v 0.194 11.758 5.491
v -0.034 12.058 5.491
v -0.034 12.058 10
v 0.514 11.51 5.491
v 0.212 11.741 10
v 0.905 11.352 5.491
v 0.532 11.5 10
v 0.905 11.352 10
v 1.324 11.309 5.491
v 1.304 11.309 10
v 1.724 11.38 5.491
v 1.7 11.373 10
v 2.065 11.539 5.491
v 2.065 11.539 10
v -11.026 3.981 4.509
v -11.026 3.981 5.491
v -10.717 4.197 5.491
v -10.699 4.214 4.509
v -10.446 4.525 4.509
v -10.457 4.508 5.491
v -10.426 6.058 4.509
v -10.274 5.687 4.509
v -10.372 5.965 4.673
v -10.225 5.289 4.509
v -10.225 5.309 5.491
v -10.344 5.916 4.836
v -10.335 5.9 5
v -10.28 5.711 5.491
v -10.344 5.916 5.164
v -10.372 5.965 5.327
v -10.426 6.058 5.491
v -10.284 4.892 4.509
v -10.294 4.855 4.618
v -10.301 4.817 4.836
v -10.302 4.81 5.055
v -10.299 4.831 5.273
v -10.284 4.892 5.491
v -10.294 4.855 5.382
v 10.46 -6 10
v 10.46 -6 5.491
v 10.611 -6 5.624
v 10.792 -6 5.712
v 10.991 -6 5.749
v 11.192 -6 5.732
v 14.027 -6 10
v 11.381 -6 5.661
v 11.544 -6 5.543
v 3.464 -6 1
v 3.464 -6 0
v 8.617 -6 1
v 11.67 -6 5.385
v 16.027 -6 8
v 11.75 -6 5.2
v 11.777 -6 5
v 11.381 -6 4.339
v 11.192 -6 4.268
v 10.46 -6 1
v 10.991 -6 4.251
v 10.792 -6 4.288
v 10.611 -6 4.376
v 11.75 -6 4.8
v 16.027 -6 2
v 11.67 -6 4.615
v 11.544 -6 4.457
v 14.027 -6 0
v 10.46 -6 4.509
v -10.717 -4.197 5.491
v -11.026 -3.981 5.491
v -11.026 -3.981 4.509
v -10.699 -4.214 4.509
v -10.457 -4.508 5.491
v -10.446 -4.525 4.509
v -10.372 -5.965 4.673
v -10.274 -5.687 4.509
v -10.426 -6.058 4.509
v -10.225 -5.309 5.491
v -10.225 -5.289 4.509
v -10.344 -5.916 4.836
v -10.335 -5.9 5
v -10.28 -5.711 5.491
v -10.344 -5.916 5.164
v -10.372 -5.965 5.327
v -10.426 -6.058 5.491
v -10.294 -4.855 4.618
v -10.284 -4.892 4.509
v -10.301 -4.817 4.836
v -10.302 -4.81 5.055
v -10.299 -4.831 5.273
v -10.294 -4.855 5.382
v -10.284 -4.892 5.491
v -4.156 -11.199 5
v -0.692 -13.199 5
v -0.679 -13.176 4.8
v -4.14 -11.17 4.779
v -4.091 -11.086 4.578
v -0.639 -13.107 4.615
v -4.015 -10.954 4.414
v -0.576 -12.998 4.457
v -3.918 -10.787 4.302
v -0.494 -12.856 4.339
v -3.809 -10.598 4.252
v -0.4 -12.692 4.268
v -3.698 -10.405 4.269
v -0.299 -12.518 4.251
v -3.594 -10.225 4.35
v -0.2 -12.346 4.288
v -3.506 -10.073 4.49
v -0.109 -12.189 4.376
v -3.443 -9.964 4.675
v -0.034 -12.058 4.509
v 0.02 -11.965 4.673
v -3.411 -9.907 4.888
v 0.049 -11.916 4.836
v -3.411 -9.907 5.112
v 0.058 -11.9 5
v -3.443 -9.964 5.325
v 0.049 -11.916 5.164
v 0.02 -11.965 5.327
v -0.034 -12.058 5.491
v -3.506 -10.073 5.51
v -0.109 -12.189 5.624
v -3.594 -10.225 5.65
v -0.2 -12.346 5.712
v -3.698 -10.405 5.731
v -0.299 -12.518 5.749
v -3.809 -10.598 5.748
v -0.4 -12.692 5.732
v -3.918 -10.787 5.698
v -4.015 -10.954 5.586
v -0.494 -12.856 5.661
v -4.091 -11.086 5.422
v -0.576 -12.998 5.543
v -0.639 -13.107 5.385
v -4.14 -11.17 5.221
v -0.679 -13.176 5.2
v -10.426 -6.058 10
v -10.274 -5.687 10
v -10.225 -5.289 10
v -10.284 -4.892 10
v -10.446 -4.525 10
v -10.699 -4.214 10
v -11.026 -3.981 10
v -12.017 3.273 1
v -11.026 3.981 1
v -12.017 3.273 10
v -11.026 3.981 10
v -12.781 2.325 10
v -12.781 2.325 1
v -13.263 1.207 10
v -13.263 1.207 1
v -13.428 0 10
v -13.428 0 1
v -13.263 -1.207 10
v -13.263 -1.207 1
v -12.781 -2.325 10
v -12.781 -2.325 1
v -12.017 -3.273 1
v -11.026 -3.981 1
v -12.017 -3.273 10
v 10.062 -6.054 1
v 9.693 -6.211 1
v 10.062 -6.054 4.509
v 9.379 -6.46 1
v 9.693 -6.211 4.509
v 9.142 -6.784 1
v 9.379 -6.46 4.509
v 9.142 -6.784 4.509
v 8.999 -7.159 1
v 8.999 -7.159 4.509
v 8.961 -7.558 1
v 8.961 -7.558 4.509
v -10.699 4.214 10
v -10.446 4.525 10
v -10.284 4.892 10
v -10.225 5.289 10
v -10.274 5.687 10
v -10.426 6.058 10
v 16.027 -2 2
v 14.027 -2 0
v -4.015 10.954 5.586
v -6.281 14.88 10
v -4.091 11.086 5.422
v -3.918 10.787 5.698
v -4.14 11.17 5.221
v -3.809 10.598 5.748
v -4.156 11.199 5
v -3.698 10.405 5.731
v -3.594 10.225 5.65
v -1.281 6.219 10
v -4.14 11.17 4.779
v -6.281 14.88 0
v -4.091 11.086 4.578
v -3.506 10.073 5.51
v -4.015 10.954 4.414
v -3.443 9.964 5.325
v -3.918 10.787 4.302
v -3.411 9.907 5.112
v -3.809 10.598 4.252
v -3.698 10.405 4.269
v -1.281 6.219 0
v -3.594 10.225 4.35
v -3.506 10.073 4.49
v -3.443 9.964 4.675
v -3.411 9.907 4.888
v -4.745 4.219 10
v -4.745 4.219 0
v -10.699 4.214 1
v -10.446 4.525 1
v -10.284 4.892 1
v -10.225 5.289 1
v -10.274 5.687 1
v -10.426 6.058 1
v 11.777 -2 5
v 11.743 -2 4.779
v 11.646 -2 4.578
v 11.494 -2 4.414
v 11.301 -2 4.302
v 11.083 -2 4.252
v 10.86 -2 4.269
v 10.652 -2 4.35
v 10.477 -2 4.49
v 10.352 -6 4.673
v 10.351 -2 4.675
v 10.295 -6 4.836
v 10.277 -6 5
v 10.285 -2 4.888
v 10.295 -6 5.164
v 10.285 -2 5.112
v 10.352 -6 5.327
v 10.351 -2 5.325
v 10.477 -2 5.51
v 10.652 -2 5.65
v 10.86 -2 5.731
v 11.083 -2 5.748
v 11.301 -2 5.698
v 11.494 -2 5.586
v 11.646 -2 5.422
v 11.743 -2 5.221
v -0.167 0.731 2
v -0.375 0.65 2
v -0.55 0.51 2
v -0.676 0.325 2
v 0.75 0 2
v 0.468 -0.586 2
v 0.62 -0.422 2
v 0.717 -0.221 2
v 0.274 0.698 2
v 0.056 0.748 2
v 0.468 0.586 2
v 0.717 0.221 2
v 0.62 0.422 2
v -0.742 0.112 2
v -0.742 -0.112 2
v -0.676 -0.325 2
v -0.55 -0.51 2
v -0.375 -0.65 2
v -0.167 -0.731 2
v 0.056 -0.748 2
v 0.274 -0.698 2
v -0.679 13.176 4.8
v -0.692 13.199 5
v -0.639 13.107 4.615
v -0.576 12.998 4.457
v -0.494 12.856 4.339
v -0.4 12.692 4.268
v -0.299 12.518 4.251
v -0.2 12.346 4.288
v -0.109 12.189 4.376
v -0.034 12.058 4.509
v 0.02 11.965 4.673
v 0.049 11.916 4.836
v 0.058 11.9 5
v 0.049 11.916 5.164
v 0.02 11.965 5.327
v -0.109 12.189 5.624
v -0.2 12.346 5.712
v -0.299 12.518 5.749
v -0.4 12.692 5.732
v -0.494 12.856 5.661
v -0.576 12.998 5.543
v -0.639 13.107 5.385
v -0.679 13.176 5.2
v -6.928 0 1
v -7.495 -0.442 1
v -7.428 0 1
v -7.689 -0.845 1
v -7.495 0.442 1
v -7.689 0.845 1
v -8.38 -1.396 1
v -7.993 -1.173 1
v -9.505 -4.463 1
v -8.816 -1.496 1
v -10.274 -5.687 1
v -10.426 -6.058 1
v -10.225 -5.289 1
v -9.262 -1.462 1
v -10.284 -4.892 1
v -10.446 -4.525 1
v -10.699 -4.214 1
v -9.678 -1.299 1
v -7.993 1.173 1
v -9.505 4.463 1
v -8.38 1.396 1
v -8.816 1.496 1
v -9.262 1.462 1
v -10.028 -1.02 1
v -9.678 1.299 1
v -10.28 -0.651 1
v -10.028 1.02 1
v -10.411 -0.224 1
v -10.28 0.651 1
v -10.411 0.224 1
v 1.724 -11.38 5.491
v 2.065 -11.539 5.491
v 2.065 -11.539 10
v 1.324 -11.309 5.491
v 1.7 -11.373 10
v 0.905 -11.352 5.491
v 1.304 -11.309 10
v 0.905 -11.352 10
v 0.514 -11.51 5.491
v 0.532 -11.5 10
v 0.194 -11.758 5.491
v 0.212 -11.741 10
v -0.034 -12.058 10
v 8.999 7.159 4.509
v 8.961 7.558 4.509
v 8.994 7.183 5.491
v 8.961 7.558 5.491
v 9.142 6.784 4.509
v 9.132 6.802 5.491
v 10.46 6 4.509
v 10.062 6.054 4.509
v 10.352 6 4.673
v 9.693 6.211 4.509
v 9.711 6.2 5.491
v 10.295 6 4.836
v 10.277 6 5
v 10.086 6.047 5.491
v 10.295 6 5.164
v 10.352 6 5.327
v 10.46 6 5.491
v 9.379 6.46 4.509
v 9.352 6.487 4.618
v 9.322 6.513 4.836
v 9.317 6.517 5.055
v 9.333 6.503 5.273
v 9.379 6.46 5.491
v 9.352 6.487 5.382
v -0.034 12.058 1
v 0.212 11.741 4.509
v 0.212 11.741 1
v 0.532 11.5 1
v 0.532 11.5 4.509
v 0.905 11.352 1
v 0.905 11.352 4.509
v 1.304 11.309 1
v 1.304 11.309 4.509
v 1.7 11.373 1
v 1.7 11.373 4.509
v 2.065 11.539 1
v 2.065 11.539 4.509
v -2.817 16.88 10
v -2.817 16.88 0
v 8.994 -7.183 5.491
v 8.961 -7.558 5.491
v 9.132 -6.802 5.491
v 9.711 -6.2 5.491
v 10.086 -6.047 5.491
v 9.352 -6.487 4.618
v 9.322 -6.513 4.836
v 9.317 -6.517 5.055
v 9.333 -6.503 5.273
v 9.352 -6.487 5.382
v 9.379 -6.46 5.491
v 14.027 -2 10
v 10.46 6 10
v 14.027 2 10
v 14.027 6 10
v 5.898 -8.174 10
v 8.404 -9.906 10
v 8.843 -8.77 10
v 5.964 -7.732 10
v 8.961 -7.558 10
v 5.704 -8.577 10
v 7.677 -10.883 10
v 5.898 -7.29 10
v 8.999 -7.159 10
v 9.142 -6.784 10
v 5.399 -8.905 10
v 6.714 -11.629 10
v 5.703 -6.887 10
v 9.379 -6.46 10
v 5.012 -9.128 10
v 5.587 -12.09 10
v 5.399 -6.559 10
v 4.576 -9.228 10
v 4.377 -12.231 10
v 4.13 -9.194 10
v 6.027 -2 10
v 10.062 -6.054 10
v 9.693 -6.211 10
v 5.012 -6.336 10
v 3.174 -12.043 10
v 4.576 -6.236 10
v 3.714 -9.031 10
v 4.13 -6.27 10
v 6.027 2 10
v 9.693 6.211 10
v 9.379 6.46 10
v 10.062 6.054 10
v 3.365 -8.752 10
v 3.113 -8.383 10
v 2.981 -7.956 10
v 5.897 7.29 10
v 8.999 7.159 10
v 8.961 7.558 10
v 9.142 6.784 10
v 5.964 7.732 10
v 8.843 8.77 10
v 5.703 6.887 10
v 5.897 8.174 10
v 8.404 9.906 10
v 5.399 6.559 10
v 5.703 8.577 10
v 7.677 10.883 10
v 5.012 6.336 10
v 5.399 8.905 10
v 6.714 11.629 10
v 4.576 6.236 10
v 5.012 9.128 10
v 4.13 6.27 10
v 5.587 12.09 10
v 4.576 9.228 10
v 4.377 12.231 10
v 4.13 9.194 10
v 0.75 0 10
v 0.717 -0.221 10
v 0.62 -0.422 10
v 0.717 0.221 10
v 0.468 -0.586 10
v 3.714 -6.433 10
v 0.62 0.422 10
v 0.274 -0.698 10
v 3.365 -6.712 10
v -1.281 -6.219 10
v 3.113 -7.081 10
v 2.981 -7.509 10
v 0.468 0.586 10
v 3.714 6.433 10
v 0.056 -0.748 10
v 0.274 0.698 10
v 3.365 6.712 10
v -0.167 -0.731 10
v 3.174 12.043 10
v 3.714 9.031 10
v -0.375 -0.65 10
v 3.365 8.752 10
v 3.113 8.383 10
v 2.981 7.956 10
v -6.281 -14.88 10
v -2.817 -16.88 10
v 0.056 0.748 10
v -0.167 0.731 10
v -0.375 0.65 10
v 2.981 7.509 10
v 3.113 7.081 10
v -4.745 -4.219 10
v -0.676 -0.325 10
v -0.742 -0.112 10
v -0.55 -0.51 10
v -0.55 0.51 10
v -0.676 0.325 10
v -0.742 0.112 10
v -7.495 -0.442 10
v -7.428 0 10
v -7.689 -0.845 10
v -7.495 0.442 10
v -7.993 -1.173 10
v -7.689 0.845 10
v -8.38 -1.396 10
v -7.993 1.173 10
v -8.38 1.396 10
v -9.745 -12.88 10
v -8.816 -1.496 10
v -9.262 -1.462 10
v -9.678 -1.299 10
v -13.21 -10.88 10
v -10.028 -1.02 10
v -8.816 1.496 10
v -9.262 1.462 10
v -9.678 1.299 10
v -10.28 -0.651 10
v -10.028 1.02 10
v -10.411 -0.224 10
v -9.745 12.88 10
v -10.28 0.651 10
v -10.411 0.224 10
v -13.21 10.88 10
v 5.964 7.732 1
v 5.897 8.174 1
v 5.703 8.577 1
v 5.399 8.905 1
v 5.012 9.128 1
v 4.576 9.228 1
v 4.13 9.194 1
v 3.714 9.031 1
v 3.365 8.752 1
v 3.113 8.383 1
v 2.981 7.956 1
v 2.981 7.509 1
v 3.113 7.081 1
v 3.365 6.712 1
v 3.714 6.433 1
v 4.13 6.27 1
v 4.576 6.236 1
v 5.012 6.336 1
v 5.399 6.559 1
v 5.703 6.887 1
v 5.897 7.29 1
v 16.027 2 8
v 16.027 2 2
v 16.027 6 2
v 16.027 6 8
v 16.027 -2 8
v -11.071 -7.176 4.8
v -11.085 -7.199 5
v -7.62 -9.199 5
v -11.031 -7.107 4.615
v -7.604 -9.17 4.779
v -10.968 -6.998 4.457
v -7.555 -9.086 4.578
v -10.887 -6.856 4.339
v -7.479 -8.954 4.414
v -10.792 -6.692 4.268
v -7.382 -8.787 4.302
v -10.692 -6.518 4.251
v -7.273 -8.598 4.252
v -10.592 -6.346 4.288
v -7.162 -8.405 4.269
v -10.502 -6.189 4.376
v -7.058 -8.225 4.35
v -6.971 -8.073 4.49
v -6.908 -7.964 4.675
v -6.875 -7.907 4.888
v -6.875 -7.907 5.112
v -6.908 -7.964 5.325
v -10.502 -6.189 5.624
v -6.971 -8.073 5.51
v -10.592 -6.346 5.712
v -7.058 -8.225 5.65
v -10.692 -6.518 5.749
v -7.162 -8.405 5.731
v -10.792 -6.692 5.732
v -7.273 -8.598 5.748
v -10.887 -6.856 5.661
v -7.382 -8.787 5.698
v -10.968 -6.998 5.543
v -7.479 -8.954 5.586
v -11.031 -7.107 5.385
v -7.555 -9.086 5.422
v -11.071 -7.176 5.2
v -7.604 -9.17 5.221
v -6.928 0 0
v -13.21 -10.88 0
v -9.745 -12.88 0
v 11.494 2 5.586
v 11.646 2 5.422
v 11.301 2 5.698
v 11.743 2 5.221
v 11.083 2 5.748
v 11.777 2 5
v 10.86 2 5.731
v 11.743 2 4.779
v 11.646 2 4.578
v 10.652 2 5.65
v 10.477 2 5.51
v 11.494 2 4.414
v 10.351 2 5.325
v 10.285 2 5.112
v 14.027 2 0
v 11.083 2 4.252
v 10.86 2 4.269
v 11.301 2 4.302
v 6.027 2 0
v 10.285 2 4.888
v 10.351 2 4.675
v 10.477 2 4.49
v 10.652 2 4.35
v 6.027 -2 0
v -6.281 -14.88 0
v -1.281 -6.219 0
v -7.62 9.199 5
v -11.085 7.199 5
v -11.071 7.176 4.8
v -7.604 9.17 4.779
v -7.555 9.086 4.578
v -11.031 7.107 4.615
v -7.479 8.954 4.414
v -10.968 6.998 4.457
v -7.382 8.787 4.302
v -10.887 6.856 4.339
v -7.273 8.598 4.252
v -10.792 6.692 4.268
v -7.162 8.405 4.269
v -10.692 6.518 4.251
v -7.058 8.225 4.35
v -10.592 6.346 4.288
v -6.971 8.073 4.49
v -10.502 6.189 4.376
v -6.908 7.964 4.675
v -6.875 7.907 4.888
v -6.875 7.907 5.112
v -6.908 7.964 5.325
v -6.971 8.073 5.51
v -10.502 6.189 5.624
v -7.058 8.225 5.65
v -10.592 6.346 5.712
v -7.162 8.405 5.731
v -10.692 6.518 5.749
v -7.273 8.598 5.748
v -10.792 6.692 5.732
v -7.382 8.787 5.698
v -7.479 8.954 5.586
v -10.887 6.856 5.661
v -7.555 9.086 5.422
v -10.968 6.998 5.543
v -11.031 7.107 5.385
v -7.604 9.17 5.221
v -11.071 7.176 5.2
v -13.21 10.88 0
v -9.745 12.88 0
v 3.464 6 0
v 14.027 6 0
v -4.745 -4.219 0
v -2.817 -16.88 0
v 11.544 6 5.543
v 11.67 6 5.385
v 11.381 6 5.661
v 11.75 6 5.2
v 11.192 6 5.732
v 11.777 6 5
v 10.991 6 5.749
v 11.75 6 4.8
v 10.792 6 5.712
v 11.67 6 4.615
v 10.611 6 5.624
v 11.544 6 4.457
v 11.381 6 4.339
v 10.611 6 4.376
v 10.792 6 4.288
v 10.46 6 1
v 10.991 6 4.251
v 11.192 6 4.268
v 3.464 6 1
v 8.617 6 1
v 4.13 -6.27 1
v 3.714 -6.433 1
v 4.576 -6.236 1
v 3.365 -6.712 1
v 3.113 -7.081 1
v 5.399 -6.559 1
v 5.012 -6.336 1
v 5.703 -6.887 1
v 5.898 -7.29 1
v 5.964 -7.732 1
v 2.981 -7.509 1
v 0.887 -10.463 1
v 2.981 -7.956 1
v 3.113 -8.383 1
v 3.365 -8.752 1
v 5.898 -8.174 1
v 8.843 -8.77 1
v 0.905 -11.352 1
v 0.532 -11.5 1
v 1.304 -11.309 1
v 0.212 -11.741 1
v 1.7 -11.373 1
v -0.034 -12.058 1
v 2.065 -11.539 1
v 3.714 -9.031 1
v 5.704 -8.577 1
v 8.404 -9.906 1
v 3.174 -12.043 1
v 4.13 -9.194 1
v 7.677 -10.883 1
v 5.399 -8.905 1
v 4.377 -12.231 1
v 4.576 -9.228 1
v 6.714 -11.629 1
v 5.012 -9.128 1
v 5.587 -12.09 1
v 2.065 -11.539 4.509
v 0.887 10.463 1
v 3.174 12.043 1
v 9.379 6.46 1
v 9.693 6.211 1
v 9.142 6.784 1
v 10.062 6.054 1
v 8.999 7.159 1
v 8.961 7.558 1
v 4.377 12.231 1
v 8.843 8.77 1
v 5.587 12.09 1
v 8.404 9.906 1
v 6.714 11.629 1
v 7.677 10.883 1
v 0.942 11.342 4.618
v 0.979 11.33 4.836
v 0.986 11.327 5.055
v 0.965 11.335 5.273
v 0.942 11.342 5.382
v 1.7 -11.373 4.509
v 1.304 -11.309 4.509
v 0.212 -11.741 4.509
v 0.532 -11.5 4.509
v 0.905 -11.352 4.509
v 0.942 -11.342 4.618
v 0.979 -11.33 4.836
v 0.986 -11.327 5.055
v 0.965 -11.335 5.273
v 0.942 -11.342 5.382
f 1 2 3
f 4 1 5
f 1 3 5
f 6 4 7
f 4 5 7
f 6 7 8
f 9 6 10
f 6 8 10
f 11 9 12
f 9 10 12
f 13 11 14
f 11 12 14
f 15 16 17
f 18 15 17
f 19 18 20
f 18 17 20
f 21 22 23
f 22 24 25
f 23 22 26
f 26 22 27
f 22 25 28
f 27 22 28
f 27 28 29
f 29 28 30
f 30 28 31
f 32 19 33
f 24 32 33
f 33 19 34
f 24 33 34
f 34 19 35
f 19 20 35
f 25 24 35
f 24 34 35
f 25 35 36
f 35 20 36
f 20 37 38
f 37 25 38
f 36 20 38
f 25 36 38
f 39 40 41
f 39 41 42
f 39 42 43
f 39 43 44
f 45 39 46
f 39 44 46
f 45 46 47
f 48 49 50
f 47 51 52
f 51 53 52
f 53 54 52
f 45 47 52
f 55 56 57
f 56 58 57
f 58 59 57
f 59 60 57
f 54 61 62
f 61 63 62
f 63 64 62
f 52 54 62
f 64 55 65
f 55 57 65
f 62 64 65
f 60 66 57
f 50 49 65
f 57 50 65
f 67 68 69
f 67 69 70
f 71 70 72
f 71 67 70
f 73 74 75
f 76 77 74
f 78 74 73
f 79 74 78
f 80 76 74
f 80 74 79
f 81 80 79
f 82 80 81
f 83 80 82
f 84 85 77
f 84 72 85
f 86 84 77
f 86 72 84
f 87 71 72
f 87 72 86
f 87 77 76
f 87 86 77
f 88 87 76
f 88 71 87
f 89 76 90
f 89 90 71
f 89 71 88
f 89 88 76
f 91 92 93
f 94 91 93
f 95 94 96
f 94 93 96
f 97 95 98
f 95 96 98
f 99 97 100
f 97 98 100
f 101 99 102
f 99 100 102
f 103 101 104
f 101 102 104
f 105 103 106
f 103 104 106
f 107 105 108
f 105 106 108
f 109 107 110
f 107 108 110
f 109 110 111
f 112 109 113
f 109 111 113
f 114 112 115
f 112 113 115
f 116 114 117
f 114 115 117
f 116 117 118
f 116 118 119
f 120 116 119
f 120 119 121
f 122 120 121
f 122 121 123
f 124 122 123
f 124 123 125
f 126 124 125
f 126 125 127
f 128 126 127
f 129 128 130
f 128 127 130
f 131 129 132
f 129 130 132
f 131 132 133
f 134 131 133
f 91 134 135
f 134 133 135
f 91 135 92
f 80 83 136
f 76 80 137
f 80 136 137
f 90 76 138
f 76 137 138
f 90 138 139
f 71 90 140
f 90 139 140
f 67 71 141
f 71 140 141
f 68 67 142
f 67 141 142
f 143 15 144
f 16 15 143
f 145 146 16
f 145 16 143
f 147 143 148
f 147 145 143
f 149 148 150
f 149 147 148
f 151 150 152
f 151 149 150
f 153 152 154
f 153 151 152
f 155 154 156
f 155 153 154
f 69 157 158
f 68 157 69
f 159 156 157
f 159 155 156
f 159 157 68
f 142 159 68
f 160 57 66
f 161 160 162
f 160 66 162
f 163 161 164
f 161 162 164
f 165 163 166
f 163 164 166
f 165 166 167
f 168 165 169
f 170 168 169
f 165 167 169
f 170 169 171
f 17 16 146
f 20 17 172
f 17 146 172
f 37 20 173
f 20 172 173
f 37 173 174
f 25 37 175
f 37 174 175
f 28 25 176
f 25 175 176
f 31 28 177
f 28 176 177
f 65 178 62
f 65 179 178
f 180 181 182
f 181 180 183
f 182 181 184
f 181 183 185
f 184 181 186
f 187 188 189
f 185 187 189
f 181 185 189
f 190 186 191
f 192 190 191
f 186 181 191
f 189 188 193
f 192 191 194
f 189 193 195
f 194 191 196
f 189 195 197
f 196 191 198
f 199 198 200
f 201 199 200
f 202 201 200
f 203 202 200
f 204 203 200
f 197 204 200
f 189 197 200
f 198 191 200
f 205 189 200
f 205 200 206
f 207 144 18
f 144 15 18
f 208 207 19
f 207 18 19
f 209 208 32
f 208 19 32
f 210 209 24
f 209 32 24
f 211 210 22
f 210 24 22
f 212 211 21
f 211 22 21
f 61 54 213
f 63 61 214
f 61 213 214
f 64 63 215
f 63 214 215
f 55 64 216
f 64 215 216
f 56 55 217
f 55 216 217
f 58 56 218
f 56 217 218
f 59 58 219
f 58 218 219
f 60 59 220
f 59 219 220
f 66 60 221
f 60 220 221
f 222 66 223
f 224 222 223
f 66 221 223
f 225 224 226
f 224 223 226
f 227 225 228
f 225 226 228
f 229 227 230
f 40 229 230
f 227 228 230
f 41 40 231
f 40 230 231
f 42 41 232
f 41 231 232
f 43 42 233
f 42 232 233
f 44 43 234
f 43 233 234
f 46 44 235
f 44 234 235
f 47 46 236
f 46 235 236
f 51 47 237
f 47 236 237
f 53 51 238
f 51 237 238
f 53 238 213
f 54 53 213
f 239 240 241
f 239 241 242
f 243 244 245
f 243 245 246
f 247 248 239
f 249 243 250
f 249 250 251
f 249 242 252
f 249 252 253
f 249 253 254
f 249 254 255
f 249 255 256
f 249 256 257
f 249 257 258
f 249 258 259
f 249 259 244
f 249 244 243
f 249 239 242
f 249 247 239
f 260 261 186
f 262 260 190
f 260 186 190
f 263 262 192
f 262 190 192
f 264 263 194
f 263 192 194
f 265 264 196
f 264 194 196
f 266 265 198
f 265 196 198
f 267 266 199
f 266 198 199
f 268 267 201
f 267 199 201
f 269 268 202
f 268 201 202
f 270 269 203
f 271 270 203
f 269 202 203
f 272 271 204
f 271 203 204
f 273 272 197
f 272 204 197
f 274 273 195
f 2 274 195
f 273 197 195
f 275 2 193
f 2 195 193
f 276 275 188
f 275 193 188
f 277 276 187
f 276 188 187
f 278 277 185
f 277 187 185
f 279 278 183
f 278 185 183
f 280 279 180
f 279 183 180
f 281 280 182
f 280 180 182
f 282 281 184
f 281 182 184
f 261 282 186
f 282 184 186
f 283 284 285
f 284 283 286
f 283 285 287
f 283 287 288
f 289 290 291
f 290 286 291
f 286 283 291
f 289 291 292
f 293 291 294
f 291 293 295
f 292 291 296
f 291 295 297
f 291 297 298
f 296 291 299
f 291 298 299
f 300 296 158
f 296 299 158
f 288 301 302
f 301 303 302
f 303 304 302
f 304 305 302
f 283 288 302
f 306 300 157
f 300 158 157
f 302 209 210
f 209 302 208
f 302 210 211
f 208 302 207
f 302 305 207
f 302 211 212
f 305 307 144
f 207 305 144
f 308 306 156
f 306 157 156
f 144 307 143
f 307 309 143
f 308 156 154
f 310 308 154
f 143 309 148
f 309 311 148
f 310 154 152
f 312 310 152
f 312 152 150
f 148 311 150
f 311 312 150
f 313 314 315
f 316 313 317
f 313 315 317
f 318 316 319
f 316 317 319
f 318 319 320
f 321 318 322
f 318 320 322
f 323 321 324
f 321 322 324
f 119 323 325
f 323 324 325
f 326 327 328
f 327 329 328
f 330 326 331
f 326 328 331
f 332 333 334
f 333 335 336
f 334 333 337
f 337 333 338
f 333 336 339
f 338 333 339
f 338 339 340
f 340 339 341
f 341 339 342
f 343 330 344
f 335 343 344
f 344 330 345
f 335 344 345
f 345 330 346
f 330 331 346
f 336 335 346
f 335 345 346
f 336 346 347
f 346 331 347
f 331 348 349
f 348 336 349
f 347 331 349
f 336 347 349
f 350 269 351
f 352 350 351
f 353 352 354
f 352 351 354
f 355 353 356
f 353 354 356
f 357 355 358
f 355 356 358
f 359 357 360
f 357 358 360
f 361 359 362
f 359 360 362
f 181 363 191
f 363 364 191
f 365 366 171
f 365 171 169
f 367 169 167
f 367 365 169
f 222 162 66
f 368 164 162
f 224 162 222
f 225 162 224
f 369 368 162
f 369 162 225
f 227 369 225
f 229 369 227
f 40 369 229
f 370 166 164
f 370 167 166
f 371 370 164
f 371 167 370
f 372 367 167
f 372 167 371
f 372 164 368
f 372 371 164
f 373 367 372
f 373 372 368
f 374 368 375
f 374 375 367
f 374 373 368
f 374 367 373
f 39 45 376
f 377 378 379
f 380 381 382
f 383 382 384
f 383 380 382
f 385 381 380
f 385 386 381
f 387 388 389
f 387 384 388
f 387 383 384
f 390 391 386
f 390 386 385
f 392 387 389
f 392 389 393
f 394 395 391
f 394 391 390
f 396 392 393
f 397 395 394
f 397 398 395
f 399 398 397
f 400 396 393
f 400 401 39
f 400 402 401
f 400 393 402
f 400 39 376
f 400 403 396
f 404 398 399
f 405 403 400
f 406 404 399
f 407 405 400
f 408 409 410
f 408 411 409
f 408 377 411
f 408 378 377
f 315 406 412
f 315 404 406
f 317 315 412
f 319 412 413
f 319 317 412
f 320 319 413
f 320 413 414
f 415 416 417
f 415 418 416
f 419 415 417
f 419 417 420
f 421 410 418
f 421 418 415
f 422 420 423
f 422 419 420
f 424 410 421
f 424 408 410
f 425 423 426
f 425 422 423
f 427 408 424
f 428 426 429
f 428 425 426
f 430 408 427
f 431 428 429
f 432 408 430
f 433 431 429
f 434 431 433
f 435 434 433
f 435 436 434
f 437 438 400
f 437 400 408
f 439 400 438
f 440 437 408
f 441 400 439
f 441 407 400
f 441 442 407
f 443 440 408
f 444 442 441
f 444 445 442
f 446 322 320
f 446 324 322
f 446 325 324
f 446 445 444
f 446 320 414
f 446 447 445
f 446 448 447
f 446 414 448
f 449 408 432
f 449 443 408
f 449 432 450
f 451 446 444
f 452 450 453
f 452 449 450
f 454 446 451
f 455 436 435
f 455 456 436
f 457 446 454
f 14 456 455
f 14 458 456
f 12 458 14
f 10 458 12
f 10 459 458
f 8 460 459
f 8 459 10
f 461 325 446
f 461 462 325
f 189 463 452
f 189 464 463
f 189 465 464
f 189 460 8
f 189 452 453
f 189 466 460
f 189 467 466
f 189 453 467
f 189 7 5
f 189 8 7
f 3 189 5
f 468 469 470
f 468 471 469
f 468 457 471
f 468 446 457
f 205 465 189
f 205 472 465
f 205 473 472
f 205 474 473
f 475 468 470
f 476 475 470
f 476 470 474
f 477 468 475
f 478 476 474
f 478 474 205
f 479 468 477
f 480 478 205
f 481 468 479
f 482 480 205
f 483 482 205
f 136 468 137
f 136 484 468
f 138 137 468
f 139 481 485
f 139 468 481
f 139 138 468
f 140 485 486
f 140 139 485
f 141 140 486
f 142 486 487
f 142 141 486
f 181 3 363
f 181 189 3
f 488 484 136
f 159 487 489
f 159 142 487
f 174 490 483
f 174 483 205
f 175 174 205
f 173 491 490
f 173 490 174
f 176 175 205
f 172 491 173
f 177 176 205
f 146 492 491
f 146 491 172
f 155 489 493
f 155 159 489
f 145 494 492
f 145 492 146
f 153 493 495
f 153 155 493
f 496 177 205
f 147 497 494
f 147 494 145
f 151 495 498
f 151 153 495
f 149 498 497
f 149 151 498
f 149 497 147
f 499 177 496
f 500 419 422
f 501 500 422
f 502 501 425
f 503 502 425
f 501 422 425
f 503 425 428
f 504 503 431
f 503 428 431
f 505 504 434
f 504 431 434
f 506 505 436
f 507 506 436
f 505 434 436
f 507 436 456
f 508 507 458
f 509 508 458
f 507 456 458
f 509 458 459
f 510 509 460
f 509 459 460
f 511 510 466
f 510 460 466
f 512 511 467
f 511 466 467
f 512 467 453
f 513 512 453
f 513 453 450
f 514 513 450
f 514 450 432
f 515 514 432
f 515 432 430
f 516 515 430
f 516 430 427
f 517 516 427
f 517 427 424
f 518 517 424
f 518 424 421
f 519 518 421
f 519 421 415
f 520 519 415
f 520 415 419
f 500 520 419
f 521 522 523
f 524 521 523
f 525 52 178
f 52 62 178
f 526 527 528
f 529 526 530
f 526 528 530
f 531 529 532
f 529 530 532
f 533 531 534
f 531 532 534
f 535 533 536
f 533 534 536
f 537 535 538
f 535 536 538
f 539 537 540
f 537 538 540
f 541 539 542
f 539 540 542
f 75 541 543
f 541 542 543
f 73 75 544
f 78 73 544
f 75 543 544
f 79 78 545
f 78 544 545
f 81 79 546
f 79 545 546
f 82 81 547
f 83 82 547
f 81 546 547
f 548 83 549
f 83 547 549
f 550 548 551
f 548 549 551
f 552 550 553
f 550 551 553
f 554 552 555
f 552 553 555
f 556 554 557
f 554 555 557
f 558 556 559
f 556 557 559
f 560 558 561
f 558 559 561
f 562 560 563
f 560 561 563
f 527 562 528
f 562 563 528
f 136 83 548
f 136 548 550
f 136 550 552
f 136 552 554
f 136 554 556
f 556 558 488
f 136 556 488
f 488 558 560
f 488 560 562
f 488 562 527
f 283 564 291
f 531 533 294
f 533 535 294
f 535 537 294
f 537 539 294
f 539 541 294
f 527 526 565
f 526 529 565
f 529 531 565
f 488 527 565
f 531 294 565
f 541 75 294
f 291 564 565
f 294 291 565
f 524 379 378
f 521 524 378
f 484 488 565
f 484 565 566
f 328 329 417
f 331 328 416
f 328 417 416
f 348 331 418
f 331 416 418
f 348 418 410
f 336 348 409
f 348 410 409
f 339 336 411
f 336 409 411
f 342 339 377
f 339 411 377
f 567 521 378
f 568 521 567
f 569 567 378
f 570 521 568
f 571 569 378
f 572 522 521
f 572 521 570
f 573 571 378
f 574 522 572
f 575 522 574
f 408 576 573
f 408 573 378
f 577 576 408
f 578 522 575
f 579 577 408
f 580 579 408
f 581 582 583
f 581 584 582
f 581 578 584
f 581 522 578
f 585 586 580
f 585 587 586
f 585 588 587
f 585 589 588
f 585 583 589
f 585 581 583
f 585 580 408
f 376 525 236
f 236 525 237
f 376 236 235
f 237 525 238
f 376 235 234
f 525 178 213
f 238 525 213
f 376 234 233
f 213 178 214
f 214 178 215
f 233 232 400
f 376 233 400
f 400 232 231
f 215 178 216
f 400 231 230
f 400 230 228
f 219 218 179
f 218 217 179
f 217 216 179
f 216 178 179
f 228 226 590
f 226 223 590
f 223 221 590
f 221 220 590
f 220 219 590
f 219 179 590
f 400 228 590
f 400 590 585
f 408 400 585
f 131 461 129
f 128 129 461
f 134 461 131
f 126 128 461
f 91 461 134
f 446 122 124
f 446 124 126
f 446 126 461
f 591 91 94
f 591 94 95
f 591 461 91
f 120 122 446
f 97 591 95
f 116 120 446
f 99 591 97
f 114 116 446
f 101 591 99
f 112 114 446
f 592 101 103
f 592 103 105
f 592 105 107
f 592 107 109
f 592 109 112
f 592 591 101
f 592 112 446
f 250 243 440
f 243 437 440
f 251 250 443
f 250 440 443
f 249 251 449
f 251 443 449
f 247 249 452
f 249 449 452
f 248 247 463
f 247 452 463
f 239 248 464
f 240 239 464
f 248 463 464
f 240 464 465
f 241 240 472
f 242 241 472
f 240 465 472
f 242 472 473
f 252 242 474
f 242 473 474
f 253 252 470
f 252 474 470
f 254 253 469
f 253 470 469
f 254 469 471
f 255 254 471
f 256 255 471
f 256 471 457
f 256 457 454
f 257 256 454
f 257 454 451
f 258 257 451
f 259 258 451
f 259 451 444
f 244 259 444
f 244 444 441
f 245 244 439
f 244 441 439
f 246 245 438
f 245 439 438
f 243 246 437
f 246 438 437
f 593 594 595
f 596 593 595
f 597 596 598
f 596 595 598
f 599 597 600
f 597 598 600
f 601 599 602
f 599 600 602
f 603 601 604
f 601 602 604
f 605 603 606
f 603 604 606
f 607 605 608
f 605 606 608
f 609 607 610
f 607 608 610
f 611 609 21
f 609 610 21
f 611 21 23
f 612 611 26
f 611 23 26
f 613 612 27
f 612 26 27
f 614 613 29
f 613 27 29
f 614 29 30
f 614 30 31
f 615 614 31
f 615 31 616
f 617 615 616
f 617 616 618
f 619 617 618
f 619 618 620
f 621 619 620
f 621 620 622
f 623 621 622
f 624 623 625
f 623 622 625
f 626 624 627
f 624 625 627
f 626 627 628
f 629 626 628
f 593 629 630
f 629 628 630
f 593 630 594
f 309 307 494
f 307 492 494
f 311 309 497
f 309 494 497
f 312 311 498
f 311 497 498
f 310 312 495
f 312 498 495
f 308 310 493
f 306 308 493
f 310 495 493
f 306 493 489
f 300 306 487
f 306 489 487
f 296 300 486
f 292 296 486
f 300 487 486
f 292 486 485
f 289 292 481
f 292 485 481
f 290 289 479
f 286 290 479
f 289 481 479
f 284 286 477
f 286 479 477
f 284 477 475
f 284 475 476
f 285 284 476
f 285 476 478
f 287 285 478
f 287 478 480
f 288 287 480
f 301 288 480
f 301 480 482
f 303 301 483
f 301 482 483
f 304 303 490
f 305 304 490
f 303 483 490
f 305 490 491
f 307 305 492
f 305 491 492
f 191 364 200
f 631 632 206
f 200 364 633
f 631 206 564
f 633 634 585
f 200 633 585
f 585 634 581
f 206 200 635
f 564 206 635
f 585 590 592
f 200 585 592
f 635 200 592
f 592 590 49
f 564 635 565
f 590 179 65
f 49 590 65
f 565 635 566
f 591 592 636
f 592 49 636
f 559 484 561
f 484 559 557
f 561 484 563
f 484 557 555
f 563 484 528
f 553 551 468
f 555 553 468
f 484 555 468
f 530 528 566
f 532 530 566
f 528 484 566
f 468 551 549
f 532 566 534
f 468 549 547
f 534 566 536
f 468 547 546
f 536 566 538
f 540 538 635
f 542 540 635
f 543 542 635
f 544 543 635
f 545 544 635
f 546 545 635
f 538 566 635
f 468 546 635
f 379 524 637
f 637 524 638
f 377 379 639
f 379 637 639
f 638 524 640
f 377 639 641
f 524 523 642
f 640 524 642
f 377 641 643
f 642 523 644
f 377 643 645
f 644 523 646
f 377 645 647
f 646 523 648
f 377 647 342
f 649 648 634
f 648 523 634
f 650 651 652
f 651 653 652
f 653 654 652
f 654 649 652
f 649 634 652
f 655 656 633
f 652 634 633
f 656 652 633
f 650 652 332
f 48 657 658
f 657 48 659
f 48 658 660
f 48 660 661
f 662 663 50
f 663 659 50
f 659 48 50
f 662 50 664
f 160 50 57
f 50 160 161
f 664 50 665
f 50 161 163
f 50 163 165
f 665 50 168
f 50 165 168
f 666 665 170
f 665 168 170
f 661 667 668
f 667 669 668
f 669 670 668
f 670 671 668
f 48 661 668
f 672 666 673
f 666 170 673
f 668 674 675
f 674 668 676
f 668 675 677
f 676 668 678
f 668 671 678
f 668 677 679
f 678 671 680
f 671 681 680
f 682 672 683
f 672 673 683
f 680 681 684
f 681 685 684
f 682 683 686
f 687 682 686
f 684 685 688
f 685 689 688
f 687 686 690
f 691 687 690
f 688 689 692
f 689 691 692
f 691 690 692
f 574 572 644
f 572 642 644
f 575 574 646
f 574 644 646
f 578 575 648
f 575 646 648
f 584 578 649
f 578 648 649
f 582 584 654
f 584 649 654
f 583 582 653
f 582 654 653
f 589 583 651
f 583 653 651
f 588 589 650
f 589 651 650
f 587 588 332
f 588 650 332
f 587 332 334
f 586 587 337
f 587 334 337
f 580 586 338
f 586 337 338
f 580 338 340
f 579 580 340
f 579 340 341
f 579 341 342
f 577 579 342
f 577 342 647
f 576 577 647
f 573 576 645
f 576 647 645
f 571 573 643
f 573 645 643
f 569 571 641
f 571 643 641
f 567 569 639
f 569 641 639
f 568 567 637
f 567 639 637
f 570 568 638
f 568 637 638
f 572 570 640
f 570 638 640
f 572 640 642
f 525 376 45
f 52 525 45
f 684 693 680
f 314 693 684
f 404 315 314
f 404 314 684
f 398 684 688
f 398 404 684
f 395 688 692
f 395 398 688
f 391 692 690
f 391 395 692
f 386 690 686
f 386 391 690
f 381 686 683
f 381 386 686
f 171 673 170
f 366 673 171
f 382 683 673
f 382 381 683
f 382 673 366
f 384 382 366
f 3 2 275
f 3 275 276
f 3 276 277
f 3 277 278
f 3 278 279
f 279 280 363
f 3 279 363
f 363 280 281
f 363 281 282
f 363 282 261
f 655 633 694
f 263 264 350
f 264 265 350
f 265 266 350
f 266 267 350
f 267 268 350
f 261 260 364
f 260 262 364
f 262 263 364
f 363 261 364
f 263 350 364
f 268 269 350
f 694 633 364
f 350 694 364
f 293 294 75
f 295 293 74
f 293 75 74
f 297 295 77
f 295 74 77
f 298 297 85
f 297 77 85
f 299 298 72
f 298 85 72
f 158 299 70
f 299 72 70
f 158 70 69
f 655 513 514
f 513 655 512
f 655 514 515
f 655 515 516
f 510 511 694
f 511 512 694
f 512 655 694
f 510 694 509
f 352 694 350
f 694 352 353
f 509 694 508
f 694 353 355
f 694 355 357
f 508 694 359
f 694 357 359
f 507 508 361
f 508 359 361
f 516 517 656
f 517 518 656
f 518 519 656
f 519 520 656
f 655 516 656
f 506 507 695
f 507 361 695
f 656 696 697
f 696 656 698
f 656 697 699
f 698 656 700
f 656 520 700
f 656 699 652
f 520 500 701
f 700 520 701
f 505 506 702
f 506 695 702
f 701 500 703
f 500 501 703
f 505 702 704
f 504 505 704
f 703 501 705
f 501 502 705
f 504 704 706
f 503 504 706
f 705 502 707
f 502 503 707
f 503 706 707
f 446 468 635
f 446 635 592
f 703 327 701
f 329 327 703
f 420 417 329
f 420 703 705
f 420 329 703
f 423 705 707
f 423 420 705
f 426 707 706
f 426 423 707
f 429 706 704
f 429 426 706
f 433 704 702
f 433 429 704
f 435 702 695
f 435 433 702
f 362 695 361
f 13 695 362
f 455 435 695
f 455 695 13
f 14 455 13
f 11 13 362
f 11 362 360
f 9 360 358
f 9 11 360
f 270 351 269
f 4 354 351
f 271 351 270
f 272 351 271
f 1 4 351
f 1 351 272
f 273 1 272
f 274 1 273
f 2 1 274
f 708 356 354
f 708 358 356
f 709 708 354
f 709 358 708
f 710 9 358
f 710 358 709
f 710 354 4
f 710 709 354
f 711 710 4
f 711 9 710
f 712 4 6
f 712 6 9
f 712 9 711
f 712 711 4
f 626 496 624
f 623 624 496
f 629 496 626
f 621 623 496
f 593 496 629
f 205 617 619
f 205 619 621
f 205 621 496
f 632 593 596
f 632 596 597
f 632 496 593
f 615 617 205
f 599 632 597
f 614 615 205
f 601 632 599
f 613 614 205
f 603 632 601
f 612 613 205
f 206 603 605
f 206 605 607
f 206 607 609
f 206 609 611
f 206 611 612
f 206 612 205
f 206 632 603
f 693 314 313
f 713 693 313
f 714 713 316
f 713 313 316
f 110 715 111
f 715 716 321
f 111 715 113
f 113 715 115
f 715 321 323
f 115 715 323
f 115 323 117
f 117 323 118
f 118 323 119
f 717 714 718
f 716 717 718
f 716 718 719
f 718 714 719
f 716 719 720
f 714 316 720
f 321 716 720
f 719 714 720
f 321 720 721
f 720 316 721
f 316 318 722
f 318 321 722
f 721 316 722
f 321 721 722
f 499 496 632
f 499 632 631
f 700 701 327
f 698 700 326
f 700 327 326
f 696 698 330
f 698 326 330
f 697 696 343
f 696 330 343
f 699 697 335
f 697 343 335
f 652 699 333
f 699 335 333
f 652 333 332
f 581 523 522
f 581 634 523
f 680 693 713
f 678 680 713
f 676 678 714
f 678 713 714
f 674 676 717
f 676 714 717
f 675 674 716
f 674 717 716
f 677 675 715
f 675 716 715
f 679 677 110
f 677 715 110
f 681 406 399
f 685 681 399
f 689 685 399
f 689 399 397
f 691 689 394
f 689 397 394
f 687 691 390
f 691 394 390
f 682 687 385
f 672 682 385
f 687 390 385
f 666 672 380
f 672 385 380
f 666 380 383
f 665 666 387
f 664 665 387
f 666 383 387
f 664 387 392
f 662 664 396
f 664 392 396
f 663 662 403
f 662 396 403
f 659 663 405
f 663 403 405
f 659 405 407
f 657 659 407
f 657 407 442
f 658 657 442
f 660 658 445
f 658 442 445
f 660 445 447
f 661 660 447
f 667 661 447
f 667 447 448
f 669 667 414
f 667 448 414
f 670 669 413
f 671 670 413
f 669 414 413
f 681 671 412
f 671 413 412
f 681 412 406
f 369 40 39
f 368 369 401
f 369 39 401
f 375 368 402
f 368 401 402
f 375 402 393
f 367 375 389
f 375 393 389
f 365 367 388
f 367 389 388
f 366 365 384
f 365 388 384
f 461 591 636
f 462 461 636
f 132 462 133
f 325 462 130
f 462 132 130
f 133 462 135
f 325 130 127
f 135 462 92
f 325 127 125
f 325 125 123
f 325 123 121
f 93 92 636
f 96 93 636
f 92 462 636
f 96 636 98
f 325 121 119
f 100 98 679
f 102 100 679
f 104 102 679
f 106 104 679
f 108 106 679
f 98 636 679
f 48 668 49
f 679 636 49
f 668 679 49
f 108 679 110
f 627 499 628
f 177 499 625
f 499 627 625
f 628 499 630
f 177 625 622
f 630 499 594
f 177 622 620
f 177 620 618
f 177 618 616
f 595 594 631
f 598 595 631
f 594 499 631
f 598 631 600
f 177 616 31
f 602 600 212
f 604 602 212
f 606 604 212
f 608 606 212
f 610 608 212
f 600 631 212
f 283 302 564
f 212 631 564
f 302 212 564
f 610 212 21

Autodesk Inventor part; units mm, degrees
ref_plane "YZ Plane" through (0, 0, 0) normal (1, 0, 0) x (0, 1, 0)
ref_plane "XZ Plane" through (0, 0, 0) normal (0, 1, 0) x (-1, 0, 0)
ref_plane "XY Plane" through (0, 0, 0) normal (0, 0, 1) x (1, 0, 0)
sketch "Sketch1" plane through (0, 0, 0) normal (0, 0, 1) x (1, 0, 0)
  line L0 (3.4641, -6) -> (11.0268, -6)
  line L1 (11.0268, -2) -> (6.0268, -2)
  line L2 (6.0268, -2) -> (6.0268, 2)
  line L3 (6.0268, 2) -> (11.0268, 2)
  line L4 (11.0268, 6) -> (3.4641, 6)
  line L5 (16.0268, 2) -> (16.0268, 6)
  line L6 (16.0268, -6) -> (16.0268, -2)
  line L7 (16.0268, 6) -> (3.4641, 6)
  line L8 (3.4641, 6) -> (0, 0)
  line L9 (0, 0) -> (3.4641, -6)
  line L10 (3.4641, -6) -> (16.0268, -6)
  line L11 (16.0268, 2) -> (6.0268, 2)
  line L12 (6.0268, 2) -> (6.0268, -2)
  line L13 (6.0268, -2) -> (16.0268, -2)
  line L14 (16.0268, 6) -> (16.0268, 2)
  line L15 (16.0268, -2) -> (16.0268, -6)
  point P0 (0, 0)
  dimension "d8" = 10
  dimension "d9" = 10
extrude "Extrusion1" add sketch "Sketch1" along normal blind 10
chamfer "Chamfer2" distance 2 angle 45 4 edges at (16.0268, 4, 10) (16.0268, -4, 10) (16.0268, -4, 0) (16.0268, 4, 0)
sketch "Sketch3" plane through (3.4641, 6, 10) normal (0, 1, 0) x (1, 0, 0)
  line L0 (10.5627, 10) -> (0, 10) projected
  line L1 (12.5627, 8) -> (12.5627, 2) projected
  circle A0 centre (7.5627, 5) radius 0.75
  point P0 (-3.4641, 10)
  dimension "d13" = 1.5
  dimension "d14" = 5
  dimension "d15" = 5
extrude "Extrusion2" cut sketch "Sketch3" against normal blind 22.7
pattern_circular "Circular Pattern1" count 3 over 360 about axis through (0, 0, 0) along (0, 0, 1) of "Extrusion1", "Extrusion2"
sketch "Sketch4" plane through (0, 0, 10) normal (0, 0, 1) x (1, 0, 0)
  circle A0 centre (0, 0) radius 0.75
  dimension "d21" = 1.5
extrude "Extrusion3" cut sketch "Sketch4" against normal blind 8
sketch "Sketch5" plane through (0, 0, 10) normal (0, 0, 1) x (1, 0, 0)
  circle A0 centre (0, 0) radius 0.75 projected
  line L0 (-2.8173, -16.8796) -> (3.4641, -6) projected
  circle A1 centre (4.4641, 7.7321) radius 1.5
  line L1 (0, 0) -> (3.4641, 6)
  line L2 (3.4641, 6) -> (4.4641, 7.7321)
  circle A2 centre (4.4641, 7.7321) radius 4.5
  dimension "d24" = 3
  dimension "d25" = 2
  dimension "d26" = 9
extrude "Extrusion4" add sketch "Sketch5" against normal blind 9 contours A2
pattern_circular "Circular Pattern2" count 3 over 360 about axis through (0, 0, 10) along (0, 0, -1) of "Extrusion4"
fillet "Fillet1" radius 1.5 2 edges at (0.8874, 10.4629, 5.5) (8.6174, 6, 5.5)
pattern_circular "Circular Pattern3" count 3 over 360 about axis through (0, 0, 10) along (0, 0, -1) of "Fillet1"
equation "\"d27\" = d26"
properties part number "Plunger2"
